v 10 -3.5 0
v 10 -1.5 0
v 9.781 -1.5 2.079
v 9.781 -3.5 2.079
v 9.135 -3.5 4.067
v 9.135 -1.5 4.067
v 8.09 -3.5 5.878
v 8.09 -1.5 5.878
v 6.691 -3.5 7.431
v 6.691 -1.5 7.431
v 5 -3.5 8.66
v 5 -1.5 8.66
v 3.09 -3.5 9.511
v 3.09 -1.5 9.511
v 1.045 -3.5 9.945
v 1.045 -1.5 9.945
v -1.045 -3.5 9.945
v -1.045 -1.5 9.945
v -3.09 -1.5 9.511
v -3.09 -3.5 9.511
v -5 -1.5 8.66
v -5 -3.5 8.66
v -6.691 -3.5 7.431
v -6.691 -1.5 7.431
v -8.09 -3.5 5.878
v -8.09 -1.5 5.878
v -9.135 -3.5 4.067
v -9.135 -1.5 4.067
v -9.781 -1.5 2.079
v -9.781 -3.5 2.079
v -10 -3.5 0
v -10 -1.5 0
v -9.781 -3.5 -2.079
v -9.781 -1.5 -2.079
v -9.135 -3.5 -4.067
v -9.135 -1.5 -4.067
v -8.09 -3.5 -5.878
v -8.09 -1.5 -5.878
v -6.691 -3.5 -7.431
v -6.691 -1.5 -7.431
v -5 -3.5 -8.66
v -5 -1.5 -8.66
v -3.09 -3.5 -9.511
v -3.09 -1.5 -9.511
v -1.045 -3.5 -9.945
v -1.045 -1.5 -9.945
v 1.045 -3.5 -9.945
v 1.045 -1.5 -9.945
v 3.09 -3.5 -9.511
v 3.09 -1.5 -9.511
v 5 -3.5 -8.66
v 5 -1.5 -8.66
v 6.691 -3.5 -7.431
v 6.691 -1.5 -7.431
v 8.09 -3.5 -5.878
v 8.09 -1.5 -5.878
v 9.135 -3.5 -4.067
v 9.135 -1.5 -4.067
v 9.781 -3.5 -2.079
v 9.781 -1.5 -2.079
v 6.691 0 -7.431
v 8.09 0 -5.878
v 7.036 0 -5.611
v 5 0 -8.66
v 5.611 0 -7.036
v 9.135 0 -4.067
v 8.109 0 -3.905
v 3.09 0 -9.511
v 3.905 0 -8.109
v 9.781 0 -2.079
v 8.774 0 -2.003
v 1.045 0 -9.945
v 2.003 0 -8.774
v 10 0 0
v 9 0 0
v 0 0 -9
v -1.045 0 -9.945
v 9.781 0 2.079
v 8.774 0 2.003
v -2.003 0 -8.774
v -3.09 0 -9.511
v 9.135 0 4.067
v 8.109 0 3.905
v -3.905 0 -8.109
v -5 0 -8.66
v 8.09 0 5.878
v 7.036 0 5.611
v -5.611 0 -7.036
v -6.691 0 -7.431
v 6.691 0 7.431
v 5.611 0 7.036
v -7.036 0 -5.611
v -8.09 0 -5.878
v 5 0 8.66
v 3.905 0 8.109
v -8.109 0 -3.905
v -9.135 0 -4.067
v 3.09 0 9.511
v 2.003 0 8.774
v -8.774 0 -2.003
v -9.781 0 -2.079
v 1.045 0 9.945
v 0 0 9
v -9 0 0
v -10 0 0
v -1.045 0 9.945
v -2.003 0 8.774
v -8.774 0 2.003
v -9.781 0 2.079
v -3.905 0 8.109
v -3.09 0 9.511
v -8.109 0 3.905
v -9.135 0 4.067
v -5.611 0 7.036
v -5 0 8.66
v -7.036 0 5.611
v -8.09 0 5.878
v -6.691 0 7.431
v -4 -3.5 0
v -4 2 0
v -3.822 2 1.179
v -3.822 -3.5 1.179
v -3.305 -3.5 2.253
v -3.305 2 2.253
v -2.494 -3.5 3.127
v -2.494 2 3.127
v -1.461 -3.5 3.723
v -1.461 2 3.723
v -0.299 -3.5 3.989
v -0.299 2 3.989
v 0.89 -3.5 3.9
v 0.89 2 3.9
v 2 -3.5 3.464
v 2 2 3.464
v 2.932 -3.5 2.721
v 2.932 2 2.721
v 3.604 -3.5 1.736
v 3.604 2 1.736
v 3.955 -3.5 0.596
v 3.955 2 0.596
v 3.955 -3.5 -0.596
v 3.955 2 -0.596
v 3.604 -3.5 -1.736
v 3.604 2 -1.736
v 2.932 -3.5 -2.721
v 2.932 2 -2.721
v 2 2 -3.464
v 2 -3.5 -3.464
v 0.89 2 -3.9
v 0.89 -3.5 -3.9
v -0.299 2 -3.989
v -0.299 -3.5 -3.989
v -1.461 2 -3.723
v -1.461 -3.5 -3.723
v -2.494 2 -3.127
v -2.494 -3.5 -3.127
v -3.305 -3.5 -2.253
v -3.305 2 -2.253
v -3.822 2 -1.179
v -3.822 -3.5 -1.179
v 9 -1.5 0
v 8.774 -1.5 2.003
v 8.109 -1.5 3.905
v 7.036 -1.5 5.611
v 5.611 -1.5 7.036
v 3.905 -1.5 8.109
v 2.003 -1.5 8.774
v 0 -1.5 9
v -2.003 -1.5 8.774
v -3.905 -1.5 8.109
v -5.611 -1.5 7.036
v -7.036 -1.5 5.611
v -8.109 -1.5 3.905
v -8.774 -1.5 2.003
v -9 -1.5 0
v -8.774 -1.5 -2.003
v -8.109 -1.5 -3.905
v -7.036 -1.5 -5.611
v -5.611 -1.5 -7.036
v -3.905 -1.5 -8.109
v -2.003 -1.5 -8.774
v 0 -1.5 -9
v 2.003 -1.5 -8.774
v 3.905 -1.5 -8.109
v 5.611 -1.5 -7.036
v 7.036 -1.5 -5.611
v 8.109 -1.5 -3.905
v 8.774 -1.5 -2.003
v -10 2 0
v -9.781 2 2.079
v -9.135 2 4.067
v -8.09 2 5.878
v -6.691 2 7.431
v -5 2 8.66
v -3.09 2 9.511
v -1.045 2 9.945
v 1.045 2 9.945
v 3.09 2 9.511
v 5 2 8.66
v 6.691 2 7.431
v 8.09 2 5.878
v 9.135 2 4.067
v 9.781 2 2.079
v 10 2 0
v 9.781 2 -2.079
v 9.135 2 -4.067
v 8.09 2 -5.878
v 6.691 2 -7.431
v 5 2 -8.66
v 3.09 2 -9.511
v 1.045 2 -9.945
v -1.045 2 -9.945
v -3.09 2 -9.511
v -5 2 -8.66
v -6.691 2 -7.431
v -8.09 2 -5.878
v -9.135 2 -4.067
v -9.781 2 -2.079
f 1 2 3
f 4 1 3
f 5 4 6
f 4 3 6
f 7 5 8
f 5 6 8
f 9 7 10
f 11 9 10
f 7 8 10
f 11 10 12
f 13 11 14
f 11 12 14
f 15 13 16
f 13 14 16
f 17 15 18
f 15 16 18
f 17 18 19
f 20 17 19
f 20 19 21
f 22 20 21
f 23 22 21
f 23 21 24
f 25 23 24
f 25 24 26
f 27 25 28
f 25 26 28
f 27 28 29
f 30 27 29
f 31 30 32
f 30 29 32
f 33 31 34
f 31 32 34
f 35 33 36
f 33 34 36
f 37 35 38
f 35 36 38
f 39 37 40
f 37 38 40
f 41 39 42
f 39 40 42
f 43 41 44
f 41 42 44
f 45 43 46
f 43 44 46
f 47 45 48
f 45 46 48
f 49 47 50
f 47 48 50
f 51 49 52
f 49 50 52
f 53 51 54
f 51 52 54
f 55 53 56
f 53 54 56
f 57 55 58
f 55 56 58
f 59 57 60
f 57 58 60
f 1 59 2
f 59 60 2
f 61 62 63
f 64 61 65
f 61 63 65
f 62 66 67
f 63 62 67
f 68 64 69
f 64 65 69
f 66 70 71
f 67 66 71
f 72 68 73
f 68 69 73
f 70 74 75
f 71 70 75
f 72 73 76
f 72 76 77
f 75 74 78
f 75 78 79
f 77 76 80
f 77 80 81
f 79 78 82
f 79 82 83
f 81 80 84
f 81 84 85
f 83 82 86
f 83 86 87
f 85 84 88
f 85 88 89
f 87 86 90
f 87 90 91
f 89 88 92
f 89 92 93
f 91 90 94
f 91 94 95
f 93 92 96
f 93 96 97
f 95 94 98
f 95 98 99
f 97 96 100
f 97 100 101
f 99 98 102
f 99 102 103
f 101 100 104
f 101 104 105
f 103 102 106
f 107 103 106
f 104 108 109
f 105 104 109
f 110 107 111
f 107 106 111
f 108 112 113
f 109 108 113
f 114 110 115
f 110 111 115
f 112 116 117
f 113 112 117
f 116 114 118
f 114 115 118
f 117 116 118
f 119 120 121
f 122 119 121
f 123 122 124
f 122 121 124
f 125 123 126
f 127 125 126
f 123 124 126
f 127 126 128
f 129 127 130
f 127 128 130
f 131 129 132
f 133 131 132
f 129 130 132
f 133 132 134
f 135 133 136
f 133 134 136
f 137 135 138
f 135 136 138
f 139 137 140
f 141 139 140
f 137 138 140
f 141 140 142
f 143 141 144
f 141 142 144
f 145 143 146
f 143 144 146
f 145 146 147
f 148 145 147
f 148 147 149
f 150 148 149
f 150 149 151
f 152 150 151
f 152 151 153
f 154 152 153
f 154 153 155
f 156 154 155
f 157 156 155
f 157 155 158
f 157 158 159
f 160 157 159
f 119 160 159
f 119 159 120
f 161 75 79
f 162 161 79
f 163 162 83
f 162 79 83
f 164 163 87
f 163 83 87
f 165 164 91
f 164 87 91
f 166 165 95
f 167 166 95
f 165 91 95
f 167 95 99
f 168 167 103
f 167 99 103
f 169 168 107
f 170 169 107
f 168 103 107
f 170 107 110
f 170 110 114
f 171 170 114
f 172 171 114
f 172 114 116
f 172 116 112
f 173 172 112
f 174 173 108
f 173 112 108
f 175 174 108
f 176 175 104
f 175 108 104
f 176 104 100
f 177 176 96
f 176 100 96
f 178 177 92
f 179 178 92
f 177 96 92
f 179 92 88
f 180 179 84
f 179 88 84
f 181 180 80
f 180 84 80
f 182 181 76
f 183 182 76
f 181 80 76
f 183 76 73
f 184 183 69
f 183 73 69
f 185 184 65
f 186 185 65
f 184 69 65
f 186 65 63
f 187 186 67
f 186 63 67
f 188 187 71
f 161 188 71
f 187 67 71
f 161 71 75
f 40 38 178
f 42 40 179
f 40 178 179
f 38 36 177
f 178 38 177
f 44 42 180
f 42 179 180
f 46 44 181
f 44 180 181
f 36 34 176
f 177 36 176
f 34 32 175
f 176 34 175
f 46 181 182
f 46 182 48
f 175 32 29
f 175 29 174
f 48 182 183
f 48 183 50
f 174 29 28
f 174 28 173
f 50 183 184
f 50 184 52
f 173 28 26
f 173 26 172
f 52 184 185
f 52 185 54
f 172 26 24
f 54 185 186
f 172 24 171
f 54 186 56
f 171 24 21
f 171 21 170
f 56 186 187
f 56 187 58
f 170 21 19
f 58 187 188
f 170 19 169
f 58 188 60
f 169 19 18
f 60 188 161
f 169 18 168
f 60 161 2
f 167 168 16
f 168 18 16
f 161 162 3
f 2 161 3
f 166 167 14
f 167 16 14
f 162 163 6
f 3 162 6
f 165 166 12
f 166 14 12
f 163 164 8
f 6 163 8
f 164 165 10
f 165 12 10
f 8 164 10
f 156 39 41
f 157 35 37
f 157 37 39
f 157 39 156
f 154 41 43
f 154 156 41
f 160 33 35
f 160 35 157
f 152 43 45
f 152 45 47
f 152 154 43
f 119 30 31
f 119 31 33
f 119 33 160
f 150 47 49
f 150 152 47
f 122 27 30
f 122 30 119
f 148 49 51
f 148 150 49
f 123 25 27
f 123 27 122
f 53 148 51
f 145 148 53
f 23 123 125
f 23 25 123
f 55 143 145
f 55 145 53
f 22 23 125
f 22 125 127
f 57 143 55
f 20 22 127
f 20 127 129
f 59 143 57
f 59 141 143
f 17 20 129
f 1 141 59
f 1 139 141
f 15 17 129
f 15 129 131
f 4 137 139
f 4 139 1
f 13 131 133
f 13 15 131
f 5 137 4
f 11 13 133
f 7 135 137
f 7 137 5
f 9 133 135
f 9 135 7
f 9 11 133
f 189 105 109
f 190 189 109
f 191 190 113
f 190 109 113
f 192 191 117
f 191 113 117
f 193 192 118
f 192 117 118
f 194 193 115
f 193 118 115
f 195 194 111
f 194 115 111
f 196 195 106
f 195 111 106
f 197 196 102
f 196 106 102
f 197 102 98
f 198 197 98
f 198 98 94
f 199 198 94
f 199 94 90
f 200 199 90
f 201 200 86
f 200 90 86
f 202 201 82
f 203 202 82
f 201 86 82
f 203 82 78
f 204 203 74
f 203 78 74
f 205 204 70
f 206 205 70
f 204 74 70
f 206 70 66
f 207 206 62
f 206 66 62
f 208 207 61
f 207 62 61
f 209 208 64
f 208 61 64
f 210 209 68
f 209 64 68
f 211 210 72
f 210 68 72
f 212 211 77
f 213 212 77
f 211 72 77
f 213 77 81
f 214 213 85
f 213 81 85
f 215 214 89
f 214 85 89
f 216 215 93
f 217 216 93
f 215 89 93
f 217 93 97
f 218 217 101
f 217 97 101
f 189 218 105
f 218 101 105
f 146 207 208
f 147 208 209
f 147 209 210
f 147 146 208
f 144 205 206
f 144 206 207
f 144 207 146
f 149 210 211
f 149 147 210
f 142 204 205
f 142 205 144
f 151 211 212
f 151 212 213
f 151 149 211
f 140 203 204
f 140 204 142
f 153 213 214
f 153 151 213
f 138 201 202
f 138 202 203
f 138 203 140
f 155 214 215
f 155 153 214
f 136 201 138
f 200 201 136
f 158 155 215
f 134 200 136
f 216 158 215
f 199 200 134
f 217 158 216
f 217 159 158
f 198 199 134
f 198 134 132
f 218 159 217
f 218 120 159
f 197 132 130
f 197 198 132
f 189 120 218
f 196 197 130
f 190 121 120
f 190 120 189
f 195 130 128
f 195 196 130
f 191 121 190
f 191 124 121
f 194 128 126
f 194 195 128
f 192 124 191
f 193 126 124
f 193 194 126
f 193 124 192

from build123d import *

# Parameters (mm, degrees)
F0_R     = 9
F1_DEPTH = 1.5
F2_R     = 10
F3_DEPTH = 2
F4_R     = 10
F5_DEPTH = 2
F7_D     = 8


with BuildPart() as f1:
    # F0 (on Front) → F1 (new body)
    with BuildSketch(Plane.XZ):
        Circle(F0_R)
    extrude(amount=F1_DEPTH)

    # F2 (on face) → F3 (join)
    with BuildSketch(Plane.XZ.offset(1.5)):
        Circle(F2_R)
    extrude(amount=F3_DEPTH)

    # F4 (on face) → F5 (join)
    with BuildSketch(Plane(origin=(0, 0, 0), x_dir=(-1, 0, 0), z_dir=(0, 1, 0))):
        Circle(F4_R)
    extrude(amount=F5_DEPTH)

    # F7 (through all)
    with Locations(Plane.XZ.offset(3.5)):
        with Locations((0, 0)):
            Hole(F7_D / 2)


solid = f1.part
